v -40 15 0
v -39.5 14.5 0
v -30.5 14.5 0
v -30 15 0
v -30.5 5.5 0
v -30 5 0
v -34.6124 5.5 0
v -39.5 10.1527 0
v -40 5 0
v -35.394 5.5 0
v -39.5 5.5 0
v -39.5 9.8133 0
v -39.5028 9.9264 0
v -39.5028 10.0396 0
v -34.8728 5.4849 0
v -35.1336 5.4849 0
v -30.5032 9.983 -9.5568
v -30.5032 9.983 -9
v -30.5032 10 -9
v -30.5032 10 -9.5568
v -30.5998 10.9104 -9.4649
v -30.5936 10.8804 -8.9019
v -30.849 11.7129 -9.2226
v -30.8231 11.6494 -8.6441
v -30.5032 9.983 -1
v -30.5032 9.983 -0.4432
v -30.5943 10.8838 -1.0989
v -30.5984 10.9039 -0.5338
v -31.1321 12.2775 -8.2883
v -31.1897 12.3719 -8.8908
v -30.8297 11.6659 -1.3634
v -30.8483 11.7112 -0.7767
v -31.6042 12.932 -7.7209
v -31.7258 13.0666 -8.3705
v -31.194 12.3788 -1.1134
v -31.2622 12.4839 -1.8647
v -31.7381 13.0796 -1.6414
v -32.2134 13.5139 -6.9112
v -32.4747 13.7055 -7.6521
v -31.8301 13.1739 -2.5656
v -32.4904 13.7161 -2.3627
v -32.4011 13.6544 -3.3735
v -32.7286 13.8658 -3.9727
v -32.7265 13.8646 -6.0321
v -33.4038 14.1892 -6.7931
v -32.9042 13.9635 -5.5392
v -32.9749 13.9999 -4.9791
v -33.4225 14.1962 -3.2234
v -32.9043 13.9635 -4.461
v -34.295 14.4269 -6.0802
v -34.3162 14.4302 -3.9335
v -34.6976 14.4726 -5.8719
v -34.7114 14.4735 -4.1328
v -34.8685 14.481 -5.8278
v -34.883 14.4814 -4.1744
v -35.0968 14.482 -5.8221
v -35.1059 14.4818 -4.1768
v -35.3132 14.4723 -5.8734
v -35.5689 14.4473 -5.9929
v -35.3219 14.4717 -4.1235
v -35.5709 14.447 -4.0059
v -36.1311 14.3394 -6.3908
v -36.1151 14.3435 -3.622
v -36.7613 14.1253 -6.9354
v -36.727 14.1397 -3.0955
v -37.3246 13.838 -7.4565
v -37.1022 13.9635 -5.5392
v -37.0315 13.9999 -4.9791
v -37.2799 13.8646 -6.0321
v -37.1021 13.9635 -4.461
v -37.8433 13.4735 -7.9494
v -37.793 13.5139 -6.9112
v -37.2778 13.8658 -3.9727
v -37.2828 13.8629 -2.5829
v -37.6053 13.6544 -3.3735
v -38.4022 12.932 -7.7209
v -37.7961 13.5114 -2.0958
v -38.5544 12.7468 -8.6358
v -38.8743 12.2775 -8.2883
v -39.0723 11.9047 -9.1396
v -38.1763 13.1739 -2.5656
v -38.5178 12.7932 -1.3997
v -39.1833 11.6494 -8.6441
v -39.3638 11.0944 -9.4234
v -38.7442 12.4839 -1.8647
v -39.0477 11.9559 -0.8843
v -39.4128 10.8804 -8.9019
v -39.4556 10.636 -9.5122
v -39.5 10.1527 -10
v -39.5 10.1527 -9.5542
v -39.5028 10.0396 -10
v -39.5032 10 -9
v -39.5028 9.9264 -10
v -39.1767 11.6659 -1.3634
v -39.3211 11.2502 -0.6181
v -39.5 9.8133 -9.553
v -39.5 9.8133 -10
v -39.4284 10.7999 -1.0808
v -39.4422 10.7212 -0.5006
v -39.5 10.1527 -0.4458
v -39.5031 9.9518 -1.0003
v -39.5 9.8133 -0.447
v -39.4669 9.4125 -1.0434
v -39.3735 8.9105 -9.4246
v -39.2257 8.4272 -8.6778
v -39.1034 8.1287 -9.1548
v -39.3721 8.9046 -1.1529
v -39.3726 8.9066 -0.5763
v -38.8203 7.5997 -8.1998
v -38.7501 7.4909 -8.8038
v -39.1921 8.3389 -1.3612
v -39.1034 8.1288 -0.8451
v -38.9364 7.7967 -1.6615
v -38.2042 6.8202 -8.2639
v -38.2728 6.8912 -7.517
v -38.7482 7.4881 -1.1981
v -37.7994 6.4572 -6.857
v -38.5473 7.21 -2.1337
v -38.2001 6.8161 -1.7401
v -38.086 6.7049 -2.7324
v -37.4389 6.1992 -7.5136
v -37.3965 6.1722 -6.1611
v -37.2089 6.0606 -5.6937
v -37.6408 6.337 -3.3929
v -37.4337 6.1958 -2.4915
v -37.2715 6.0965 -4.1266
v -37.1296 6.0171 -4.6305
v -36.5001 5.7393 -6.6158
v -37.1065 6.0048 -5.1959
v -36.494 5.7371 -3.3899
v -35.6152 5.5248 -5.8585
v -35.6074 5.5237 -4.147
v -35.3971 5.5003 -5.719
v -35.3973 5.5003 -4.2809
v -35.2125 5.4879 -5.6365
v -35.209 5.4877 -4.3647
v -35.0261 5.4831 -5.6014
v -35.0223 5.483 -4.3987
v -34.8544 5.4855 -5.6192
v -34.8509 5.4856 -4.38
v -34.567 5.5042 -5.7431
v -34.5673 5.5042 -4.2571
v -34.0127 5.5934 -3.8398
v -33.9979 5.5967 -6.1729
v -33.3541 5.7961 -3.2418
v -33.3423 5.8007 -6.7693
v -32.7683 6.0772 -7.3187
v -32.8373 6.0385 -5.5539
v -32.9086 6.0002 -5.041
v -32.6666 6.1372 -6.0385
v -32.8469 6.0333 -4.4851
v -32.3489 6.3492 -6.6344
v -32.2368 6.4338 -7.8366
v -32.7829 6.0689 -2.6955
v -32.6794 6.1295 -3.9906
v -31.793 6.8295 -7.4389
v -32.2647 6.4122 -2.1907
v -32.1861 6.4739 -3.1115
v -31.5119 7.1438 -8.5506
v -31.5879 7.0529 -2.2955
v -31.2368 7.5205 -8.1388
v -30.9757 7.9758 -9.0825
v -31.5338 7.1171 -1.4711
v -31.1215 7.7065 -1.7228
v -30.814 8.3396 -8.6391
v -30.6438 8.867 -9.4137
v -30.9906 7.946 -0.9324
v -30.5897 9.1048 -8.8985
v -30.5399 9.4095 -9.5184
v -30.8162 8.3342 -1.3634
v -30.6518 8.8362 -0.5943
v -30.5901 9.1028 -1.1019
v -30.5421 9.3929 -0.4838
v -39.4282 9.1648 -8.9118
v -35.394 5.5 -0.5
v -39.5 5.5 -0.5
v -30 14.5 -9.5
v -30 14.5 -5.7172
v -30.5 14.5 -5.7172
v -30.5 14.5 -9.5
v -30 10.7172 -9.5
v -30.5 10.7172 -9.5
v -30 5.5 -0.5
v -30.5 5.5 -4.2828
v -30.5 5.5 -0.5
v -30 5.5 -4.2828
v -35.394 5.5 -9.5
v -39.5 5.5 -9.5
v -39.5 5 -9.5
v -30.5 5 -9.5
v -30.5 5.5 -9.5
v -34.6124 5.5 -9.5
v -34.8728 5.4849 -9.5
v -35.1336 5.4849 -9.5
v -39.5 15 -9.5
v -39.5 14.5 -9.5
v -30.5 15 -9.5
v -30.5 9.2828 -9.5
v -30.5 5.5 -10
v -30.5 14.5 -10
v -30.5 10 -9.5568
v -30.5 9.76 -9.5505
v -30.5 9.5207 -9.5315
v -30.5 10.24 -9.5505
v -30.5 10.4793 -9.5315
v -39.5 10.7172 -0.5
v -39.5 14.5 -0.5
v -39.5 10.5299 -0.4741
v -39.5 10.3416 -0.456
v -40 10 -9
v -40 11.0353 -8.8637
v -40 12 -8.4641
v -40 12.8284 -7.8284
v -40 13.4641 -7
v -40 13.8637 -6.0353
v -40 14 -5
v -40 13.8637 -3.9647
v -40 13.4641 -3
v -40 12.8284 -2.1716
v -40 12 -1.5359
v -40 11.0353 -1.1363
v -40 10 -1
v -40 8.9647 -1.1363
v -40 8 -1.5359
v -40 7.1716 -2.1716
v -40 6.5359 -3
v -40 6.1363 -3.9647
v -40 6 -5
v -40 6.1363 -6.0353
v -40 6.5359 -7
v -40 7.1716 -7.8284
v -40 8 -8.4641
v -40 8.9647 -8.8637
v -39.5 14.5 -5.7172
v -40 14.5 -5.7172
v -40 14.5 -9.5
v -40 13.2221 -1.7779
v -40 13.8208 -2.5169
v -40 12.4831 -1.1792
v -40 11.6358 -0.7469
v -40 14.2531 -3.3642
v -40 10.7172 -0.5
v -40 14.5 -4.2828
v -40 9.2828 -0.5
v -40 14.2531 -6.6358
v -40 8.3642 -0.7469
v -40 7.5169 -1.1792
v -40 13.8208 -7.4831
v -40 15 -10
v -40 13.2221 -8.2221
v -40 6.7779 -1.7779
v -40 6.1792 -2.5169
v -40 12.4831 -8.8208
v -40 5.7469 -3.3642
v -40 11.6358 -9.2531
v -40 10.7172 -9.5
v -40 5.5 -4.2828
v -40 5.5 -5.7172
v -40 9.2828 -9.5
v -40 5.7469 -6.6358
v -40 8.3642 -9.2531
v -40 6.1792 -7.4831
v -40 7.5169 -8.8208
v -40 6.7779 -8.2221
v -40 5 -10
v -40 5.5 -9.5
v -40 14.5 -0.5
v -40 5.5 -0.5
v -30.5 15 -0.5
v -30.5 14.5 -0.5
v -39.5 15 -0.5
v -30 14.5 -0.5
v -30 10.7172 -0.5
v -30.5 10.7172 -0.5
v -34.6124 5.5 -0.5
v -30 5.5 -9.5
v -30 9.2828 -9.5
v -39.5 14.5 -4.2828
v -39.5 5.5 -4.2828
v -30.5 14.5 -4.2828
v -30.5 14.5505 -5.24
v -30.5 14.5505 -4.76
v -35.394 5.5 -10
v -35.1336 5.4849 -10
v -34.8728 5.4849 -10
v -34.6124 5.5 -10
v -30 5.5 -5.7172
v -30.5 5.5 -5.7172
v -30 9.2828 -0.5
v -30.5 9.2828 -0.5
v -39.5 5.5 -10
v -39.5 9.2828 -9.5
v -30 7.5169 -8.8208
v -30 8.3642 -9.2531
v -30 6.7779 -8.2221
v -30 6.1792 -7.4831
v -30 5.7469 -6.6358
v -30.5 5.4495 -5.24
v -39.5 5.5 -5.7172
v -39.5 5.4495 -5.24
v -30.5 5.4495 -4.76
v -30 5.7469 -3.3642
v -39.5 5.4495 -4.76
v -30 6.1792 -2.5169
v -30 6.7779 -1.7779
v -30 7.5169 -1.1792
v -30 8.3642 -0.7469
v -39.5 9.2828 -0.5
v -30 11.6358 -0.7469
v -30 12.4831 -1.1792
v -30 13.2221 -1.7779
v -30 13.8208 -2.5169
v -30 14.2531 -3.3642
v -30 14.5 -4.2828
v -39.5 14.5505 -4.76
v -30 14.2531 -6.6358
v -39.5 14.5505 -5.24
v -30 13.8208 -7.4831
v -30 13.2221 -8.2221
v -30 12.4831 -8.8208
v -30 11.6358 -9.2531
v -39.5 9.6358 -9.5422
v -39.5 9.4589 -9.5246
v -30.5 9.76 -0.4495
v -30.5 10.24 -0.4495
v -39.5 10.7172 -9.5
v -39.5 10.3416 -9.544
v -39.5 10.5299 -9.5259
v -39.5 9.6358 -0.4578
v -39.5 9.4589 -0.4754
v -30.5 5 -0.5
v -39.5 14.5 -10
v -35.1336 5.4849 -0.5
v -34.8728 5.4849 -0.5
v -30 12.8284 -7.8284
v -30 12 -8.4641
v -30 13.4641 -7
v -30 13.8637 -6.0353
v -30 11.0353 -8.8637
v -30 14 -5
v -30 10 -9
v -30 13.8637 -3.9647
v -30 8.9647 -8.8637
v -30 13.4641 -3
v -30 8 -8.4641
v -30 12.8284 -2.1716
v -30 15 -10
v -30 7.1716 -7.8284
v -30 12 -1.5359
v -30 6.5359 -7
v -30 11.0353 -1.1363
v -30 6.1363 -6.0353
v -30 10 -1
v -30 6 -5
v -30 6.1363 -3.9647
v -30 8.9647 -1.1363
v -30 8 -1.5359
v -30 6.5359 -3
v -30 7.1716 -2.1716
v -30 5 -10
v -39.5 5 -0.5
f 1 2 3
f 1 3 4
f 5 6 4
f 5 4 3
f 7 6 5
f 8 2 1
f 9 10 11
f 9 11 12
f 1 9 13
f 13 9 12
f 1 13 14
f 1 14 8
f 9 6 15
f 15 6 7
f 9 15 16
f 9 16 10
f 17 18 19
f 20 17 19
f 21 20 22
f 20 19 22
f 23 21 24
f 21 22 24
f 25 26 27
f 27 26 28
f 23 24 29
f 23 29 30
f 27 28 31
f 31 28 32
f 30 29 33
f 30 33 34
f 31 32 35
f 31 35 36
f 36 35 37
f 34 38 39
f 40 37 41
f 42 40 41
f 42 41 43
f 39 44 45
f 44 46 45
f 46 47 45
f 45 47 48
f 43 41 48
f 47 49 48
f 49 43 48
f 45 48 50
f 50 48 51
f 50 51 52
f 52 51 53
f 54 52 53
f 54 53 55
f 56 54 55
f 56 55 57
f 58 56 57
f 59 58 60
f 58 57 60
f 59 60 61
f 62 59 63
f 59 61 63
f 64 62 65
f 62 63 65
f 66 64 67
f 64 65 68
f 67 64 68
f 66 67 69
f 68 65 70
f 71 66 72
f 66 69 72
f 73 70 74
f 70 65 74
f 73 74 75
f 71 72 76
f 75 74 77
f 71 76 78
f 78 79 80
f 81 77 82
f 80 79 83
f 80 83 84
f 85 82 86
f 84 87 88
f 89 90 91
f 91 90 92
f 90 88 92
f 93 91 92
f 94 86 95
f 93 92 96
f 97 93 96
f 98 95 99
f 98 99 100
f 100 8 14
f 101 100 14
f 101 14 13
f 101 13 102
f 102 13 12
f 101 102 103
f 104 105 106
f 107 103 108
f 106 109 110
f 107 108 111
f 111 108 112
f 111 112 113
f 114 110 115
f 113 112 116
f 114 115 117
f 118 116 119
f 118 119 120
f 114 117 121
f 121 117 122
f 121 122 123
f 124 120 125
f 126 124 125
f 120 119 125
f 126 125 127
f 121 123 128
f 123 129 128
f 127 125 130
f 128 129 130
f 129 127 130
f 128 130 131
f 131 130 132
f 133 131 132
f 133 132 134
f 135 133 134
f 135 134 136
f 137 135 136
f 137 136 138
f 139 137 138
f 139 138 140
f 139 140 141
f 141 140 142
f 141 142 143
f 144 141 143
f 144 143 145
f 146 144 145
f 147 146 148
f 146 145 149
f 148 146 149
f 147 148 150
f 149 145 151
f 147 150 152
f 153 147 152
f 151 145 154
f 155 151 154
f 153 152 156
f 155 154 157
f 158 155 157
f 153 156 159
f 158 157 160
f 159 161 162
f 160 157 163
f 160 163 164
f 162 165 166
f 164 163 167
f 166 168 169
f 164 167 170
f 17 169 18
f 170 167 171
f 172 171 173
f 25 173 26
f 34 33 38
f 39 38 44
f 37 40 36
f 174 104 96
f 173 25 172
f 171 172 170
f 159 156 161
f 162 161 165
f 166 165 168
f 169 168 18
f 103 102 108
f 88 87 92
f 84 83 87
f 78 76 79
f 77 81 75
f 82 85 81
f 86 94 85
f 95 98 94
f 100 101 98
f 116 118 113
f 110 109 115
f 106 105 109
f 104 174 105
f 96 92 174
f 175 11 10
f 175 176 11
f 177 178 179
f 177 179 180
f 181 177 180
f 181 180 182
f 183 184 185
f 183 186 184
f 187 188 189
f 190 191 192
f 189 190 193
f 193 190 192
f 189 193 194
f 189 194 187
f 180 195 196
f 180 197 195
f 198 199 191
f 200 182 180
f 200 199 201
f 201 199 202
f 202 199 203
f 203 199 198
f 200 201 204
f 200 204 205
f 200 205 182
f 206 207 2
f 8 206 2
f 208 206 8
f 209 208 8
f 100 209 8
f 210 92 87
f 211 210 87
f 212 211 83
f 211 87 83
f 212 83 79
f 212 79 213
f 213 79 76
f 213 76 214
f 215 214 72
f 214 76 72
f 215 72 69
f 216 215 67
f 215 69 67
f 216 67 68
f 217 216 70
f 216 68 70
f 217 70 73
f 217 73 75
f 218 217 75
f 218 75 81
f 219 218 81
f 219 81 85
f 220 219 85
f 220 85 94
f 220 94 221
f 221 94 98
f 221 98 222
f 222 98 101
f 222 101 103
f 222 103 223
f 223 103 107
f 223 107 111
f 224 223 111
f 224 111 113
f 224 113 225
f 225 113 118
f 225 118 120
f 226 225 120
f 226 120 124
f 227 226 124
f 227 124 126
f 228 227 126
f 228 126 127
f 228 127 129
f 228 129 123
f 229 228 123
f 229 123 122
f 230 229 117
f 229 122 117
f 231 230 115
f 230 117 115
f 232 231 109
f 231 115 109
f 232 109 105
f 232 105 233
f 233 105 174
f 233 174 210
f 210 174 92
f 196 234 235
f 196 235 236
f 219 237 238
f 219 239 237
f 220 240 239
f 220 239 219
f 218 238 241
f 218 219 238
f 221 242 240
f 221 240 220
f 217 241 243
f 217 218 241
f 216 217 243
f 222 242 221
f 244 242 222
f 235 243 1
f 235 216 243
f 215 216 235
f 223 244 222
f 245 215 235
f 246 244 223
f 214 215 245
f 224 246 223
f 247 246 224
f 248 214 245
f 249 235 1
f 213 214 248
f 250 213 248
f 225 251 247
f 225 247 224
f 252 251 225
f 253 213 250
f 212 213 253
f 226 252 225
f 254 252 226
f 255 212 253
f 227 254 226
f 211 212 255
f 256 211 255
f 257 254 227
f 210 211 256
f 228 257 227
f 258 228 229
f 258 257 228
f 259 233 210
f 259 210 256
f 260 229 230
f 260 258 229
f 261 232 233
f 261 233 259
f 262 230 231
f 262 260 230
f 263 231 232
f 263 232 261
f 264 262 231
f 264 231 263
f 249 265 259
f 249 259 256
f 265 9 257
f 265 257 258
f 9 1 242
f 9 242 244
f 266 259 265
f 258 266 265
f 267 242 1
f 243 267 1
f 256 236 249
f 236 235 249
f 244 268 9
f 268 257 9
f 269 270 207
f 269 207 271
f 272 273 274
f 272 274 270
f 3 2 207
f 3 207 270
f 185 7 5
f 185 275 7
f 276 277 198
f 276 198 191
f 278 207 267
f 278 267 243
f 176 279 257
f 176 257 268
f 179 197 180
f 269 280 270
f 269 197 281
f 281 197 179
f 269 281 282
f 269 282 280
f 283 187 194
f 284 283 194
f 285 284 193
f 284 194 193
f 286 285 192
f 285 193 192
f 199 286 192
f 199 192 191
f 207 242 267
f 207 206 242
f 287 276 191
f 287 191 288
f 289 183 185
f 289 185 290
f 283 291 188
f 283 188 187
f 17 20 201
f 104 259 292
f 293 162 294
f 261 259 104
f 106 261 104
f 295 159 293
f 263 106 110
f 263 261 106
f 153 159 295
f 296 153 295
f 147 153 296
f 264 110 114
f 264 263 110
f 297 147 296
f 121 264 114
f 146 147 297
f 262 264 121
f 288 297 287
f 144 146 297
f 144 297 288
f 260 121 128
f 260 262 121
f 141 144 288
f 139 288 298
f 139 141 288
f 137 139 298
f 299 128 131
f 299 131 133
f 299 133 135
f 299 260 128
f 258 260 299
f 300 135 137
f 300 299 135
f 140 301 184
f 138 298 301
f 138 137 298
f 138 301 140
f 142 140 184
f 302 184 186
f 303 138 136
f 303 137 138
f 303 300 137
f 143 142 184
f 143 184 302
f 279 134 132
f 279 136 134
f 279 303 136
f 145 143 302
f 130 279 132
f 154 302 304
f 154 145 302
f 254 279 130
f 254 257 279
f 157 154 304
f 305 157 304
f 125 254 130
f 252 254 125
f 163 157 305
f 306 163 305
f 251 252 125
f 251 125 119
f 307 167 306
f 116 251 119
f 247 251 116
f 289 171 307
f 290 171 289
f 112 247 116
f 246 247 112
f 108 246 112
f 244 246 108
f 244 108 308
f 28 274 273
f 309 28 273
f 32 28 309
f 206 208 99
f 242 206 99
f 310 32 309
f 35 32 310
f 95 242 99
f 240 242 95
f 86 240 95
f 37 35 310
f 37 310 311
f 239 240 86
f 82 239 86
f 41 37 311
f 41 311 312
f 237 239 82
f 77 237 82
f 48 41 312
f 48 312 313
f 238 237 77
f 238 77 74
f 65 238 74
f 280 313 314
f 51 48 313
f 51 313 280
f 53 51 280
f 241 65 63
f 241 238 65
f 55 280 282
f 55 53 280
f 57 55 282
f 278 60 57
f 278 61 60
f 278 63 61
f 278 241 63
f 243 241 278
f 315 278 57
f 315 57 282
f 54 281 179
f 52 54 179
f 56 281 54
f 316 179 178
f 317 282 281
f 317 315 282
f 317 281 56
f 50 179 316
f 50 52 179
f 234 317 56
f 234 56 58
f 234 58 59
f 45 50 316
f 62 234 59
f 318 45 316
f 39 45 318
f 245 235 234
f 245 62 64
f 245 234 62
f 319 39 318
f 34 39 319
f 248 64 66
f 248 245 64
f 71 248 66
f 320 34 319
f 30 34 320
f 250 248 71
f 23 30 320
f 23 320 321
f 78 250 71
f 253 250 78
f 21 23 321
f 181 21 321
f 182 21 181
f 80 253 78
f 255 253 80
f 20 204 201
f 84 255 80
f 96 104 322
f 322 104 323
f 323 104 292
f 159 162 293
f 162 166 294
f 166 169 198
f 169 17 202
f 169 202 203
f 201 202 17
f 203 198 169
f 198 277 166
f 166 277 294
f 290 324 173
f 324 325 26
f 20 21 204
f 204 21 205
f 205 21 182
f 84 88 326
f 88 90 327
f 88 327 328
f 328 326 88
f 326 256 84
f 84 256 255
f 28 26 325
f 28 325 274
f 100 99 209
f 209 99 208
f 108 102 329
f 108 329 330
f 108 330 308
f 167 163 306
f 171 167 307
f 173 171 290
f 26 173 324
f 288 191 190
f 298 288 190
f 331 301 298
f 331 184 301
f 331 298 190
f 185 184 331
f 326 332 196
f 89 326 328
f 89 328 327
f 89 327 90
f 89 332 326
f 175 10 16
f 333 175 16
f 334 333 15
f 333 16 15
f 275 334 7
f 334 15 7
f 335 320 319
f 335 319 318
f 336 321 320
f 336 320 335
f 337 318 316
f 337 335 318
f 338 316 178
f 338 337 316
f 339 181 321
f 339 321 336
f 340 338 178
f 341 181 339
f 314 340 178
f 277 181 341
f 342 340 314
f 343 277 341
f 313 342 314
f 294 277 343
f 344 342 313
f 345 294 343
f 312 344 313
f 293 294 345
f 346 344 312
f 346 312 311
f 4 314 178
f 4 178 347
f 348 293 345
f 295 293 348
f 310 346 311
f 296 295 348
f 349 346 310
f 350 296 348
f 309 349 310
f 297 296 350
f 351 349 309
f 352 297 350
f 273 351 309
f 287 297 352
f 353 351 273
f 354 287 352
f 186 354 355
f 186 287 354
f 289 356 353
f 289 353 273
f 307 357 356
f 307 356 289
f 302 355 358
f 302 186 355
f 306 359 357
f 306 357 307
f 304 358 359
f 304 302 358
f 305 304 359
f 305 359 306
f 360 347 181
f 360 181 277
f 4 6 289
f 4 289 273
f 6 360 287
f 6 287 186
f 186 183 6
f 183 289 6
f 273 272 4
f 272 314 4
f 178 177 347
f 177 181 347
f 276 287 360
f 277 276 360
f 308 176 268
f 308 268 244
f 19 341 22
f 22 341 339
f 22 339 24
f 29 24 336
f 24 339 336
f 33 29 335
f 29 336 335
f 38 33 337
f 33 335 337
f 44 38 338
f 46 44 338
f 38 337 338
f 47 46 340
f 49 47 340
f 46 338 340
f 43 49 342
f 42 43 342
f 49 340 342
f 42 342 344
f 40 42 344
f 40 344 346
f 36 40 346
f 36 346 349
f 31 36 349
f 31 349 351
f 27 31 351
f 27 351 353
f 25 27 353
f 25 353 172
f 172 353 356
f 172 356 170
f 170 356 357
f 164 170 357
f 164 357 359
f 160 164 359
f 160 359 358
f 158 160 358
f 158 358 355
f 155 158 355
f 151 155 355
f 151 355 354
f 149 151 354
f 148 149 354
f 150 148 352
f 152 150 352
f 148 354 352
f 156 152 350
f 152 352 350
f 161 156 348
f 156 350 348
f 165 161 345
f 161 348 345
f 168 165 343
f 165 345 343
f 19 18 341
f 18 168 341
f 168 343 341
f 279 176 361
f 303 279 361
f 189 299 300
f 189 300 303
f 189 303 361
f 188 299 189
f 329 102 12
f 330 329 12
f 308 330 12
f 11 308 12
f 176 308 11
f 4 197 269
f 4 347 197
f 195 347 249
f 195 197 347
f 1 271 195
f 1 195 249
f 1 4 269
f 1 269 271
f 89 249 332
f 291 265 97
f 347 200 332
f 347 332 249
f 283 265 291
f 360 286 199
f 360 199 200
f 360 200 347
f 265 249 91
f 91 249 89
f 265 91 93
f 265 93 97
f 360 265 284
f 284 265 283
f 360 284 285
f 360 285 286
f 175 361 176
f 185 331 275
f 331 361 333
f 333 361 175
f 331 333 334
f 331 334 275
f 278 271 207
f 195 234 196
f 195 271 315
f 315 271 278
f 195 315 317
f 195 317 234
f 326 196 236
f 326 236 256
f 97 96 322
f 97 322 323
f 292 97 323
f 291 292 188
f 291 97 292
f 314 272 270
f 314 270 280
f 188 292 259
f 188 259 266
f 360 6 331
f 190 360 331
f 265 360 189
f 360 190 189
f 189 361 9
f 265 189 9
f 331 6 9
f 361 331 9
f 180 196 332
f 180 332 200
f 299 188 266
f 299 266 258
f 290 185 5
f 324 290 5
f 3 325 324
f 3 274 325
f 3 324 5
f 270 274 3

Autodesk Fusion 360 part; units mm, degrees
sketch "Sketch1" plane through (0, 0, 0) normal (0, 1, 0) x (1, 0, 0)
  line L0 (-35, 18) -> (-29, 18)
  line L1 (-29, 18) -> (-29, 12)
  line L2 (-29, 12) -> (-35, 12)
  line L3 (-35, 12) -> (-35, 18)
sketch "Sketch2" plane through (0, 5, 0) normal (0, 1, 0) x (-1, 0, 0)
  line L0 (35, -12) -> (29, -12)
  line L1 (29, -12) -> (29, -18)
  line L2 (29, -18) -> (35, -18)
  line L3 (35, -18) -> (35, -12)
  line L4 (30, 0) -> (40, 0)
  line L5 (40, 0) -> (40, -10)
  line L6 (40, -10) -> (30, -10)
  line L7 (30, -10) -> (30, 0)
extrude "Extrude2" add sketch "Sketch2" along normal blind 10 contours L4 L5 L6 L7 makes body 1
sketch "Sketch3" plane through (0, 15, 0) normal (0, 1, 0) x (-1, 0, 0)
  line L0 (30, -10) -> (40, -10)
  line L1 (40, -10) -> (40, 0)
  line L2 (40, 0) -> (30, 0)
  line L3 (30, 0) -> (30, -10)
  line L4 (39.5, -9.5) -> (30.5, -9.5)
  line L5 (30.5, -9.5) -> (30.5, -0.5)
  line L6 (30.5, -0.5) -> (39.5, -0.5)
  line L7 (39.5, -0.5) -> (39.5, -9.5)
extrude "Extrude3" cut sketch "Sketch3" against normal blind 18 contours L4 L5 L6 L7 bodies 1
sketch "Sketch4" plane through (-30, 0, 0) normal (1, 0, 0) x (0, 0, -1)
  line L0 (0, 5) -> (10, 5)
  line L1 (10, 5) -> (10, 15)
  line L2 (10, 15) -> (0, 15)
  line L3 (0, 15) -> (0, 5)
  line L4 (0.5, 14.5) -> (9.5, 14.5)
  line L5 (9.5, 14.5) -> (9.5, 5.5)
  line L6 (9.5, 5.5) -> (0.5, 5.5)
  line L7 (0.5, 5.5) -> (0.5, 14.5)
  line L8 (0.5, 15) -> (0.5, 5)
  line L9 (9.5, 15) -> (9.5, 5)
extrude "Extrude4" cut sketch "Sketch4" against normal blind 16 contours L4 L5 L6 L7 L8 L9 bodies 1
sketch "Sketch5" plane through (0, 0, 0) normal (0, 0, 1) x (1, 0, 0)
  line L0 (-40, 5) -> (-30, 5)
  line L1 (-30, 5) -> (-30, 15)
  line L2 (-30, 15) -> (-40, 15)
  line L3 (-40, 15) -> (-40, 5)
  line L4 (-39.5, 14.5) -> (-30.5, 14.5)
  line L5 (-30.5, 14.5) -> (-30.5, 6)
  line L6 (-30.5, 6) -> (-39.5, 6)
  line L7 (-39.5, 6) -> (-39.5, 14.5)
  dimension "d9" = 8.5
extrude "Extrude5" cut sketch "Sketch5" against normal blind 23 contours L4 L5 L6 L7 bodies 1
sketch "Sketch6" plane through (0, 0, -10) normal (0, 0, -1) x (-1, 0, 0)
  line L0 (30.5, 6) -> (30.5, 14.5)
  line L1 (30.5, 14.5) -> (39.5, 14.5)
  line L2 (39.5, 14.5) -> (39.5, 6)
  line L3 (39.5, 6) -> (30.5, 6)
  line L4 (30, 5) -> (40, 5)
  line L5 (40, 5) -> (40, 15)
  line L6 (40, 15) -> (30, 15)
  line L7 (30, 15) -> (30, 5)
  line L8 (30.5, 6) -> (39.5, 6)
  line L9 (39.5, 6) -> (39.5, 5.5)
  line L10 (39.5, 5.5) -> (30.5, 5.5)
  line L11 (30.5, 5.5) -> (30.5, 6)
  point P0 (39.5, 5.5)
extrude "Extrude6" cut sketch "Sketch6" against normal blind 26.5 contours L3 L8 L9 L10 L11 bodies 1
sketch "Sketch7" plane through (0, 0, 0) normal (1, 0, 0) x (0, 0, -1)
sketch "Sketch8" plane through (0, 0, 0) normal (1, 0, 0) x (0, 0, -1)
  circle A0 centre (5, 10) radius 4.5568
  dimension "d15" = 9.1136
extrude "Extrude7" add sketch "Sketch8" along normal blind 10 separate body makes body 2
move_body "Move1" bodies 2 to x (1, 0, 0) y (0, 1, 0) z (0, 0, 1) at (-40, 0, 2)
move_body "Move2" bodies 2 to x (1, 0, 0) y (0, 1, 0) z (0, 0, 1) at (0, 0, -2)
sketch "Sketch9" plane through (-30, 0, 0) normal (1, 0, 0) x (0, 0, -1)
  circle A0 centre (5, 10) radius 4.5568
  circle A1 centre (5, 10) radius 4
  dimension "d24" = 8
extrude "Extrude8" cut sketch "Sketch9" against normal blind 18 contours A1 bodies 2
sketch "Sketch10" plane through (0, 0, 0) normal (0, 0, 1) x (1, 0, 0)
  circle A0 centre (-35.0032, 9.983) radius 4.5
  dimension "d27" = 9
extrude "Extrude9" cut sketch "Sketch10" against normal blind 22 bodies 1 2
combine "Combine1" operation add target body 1 tool bodies 2
